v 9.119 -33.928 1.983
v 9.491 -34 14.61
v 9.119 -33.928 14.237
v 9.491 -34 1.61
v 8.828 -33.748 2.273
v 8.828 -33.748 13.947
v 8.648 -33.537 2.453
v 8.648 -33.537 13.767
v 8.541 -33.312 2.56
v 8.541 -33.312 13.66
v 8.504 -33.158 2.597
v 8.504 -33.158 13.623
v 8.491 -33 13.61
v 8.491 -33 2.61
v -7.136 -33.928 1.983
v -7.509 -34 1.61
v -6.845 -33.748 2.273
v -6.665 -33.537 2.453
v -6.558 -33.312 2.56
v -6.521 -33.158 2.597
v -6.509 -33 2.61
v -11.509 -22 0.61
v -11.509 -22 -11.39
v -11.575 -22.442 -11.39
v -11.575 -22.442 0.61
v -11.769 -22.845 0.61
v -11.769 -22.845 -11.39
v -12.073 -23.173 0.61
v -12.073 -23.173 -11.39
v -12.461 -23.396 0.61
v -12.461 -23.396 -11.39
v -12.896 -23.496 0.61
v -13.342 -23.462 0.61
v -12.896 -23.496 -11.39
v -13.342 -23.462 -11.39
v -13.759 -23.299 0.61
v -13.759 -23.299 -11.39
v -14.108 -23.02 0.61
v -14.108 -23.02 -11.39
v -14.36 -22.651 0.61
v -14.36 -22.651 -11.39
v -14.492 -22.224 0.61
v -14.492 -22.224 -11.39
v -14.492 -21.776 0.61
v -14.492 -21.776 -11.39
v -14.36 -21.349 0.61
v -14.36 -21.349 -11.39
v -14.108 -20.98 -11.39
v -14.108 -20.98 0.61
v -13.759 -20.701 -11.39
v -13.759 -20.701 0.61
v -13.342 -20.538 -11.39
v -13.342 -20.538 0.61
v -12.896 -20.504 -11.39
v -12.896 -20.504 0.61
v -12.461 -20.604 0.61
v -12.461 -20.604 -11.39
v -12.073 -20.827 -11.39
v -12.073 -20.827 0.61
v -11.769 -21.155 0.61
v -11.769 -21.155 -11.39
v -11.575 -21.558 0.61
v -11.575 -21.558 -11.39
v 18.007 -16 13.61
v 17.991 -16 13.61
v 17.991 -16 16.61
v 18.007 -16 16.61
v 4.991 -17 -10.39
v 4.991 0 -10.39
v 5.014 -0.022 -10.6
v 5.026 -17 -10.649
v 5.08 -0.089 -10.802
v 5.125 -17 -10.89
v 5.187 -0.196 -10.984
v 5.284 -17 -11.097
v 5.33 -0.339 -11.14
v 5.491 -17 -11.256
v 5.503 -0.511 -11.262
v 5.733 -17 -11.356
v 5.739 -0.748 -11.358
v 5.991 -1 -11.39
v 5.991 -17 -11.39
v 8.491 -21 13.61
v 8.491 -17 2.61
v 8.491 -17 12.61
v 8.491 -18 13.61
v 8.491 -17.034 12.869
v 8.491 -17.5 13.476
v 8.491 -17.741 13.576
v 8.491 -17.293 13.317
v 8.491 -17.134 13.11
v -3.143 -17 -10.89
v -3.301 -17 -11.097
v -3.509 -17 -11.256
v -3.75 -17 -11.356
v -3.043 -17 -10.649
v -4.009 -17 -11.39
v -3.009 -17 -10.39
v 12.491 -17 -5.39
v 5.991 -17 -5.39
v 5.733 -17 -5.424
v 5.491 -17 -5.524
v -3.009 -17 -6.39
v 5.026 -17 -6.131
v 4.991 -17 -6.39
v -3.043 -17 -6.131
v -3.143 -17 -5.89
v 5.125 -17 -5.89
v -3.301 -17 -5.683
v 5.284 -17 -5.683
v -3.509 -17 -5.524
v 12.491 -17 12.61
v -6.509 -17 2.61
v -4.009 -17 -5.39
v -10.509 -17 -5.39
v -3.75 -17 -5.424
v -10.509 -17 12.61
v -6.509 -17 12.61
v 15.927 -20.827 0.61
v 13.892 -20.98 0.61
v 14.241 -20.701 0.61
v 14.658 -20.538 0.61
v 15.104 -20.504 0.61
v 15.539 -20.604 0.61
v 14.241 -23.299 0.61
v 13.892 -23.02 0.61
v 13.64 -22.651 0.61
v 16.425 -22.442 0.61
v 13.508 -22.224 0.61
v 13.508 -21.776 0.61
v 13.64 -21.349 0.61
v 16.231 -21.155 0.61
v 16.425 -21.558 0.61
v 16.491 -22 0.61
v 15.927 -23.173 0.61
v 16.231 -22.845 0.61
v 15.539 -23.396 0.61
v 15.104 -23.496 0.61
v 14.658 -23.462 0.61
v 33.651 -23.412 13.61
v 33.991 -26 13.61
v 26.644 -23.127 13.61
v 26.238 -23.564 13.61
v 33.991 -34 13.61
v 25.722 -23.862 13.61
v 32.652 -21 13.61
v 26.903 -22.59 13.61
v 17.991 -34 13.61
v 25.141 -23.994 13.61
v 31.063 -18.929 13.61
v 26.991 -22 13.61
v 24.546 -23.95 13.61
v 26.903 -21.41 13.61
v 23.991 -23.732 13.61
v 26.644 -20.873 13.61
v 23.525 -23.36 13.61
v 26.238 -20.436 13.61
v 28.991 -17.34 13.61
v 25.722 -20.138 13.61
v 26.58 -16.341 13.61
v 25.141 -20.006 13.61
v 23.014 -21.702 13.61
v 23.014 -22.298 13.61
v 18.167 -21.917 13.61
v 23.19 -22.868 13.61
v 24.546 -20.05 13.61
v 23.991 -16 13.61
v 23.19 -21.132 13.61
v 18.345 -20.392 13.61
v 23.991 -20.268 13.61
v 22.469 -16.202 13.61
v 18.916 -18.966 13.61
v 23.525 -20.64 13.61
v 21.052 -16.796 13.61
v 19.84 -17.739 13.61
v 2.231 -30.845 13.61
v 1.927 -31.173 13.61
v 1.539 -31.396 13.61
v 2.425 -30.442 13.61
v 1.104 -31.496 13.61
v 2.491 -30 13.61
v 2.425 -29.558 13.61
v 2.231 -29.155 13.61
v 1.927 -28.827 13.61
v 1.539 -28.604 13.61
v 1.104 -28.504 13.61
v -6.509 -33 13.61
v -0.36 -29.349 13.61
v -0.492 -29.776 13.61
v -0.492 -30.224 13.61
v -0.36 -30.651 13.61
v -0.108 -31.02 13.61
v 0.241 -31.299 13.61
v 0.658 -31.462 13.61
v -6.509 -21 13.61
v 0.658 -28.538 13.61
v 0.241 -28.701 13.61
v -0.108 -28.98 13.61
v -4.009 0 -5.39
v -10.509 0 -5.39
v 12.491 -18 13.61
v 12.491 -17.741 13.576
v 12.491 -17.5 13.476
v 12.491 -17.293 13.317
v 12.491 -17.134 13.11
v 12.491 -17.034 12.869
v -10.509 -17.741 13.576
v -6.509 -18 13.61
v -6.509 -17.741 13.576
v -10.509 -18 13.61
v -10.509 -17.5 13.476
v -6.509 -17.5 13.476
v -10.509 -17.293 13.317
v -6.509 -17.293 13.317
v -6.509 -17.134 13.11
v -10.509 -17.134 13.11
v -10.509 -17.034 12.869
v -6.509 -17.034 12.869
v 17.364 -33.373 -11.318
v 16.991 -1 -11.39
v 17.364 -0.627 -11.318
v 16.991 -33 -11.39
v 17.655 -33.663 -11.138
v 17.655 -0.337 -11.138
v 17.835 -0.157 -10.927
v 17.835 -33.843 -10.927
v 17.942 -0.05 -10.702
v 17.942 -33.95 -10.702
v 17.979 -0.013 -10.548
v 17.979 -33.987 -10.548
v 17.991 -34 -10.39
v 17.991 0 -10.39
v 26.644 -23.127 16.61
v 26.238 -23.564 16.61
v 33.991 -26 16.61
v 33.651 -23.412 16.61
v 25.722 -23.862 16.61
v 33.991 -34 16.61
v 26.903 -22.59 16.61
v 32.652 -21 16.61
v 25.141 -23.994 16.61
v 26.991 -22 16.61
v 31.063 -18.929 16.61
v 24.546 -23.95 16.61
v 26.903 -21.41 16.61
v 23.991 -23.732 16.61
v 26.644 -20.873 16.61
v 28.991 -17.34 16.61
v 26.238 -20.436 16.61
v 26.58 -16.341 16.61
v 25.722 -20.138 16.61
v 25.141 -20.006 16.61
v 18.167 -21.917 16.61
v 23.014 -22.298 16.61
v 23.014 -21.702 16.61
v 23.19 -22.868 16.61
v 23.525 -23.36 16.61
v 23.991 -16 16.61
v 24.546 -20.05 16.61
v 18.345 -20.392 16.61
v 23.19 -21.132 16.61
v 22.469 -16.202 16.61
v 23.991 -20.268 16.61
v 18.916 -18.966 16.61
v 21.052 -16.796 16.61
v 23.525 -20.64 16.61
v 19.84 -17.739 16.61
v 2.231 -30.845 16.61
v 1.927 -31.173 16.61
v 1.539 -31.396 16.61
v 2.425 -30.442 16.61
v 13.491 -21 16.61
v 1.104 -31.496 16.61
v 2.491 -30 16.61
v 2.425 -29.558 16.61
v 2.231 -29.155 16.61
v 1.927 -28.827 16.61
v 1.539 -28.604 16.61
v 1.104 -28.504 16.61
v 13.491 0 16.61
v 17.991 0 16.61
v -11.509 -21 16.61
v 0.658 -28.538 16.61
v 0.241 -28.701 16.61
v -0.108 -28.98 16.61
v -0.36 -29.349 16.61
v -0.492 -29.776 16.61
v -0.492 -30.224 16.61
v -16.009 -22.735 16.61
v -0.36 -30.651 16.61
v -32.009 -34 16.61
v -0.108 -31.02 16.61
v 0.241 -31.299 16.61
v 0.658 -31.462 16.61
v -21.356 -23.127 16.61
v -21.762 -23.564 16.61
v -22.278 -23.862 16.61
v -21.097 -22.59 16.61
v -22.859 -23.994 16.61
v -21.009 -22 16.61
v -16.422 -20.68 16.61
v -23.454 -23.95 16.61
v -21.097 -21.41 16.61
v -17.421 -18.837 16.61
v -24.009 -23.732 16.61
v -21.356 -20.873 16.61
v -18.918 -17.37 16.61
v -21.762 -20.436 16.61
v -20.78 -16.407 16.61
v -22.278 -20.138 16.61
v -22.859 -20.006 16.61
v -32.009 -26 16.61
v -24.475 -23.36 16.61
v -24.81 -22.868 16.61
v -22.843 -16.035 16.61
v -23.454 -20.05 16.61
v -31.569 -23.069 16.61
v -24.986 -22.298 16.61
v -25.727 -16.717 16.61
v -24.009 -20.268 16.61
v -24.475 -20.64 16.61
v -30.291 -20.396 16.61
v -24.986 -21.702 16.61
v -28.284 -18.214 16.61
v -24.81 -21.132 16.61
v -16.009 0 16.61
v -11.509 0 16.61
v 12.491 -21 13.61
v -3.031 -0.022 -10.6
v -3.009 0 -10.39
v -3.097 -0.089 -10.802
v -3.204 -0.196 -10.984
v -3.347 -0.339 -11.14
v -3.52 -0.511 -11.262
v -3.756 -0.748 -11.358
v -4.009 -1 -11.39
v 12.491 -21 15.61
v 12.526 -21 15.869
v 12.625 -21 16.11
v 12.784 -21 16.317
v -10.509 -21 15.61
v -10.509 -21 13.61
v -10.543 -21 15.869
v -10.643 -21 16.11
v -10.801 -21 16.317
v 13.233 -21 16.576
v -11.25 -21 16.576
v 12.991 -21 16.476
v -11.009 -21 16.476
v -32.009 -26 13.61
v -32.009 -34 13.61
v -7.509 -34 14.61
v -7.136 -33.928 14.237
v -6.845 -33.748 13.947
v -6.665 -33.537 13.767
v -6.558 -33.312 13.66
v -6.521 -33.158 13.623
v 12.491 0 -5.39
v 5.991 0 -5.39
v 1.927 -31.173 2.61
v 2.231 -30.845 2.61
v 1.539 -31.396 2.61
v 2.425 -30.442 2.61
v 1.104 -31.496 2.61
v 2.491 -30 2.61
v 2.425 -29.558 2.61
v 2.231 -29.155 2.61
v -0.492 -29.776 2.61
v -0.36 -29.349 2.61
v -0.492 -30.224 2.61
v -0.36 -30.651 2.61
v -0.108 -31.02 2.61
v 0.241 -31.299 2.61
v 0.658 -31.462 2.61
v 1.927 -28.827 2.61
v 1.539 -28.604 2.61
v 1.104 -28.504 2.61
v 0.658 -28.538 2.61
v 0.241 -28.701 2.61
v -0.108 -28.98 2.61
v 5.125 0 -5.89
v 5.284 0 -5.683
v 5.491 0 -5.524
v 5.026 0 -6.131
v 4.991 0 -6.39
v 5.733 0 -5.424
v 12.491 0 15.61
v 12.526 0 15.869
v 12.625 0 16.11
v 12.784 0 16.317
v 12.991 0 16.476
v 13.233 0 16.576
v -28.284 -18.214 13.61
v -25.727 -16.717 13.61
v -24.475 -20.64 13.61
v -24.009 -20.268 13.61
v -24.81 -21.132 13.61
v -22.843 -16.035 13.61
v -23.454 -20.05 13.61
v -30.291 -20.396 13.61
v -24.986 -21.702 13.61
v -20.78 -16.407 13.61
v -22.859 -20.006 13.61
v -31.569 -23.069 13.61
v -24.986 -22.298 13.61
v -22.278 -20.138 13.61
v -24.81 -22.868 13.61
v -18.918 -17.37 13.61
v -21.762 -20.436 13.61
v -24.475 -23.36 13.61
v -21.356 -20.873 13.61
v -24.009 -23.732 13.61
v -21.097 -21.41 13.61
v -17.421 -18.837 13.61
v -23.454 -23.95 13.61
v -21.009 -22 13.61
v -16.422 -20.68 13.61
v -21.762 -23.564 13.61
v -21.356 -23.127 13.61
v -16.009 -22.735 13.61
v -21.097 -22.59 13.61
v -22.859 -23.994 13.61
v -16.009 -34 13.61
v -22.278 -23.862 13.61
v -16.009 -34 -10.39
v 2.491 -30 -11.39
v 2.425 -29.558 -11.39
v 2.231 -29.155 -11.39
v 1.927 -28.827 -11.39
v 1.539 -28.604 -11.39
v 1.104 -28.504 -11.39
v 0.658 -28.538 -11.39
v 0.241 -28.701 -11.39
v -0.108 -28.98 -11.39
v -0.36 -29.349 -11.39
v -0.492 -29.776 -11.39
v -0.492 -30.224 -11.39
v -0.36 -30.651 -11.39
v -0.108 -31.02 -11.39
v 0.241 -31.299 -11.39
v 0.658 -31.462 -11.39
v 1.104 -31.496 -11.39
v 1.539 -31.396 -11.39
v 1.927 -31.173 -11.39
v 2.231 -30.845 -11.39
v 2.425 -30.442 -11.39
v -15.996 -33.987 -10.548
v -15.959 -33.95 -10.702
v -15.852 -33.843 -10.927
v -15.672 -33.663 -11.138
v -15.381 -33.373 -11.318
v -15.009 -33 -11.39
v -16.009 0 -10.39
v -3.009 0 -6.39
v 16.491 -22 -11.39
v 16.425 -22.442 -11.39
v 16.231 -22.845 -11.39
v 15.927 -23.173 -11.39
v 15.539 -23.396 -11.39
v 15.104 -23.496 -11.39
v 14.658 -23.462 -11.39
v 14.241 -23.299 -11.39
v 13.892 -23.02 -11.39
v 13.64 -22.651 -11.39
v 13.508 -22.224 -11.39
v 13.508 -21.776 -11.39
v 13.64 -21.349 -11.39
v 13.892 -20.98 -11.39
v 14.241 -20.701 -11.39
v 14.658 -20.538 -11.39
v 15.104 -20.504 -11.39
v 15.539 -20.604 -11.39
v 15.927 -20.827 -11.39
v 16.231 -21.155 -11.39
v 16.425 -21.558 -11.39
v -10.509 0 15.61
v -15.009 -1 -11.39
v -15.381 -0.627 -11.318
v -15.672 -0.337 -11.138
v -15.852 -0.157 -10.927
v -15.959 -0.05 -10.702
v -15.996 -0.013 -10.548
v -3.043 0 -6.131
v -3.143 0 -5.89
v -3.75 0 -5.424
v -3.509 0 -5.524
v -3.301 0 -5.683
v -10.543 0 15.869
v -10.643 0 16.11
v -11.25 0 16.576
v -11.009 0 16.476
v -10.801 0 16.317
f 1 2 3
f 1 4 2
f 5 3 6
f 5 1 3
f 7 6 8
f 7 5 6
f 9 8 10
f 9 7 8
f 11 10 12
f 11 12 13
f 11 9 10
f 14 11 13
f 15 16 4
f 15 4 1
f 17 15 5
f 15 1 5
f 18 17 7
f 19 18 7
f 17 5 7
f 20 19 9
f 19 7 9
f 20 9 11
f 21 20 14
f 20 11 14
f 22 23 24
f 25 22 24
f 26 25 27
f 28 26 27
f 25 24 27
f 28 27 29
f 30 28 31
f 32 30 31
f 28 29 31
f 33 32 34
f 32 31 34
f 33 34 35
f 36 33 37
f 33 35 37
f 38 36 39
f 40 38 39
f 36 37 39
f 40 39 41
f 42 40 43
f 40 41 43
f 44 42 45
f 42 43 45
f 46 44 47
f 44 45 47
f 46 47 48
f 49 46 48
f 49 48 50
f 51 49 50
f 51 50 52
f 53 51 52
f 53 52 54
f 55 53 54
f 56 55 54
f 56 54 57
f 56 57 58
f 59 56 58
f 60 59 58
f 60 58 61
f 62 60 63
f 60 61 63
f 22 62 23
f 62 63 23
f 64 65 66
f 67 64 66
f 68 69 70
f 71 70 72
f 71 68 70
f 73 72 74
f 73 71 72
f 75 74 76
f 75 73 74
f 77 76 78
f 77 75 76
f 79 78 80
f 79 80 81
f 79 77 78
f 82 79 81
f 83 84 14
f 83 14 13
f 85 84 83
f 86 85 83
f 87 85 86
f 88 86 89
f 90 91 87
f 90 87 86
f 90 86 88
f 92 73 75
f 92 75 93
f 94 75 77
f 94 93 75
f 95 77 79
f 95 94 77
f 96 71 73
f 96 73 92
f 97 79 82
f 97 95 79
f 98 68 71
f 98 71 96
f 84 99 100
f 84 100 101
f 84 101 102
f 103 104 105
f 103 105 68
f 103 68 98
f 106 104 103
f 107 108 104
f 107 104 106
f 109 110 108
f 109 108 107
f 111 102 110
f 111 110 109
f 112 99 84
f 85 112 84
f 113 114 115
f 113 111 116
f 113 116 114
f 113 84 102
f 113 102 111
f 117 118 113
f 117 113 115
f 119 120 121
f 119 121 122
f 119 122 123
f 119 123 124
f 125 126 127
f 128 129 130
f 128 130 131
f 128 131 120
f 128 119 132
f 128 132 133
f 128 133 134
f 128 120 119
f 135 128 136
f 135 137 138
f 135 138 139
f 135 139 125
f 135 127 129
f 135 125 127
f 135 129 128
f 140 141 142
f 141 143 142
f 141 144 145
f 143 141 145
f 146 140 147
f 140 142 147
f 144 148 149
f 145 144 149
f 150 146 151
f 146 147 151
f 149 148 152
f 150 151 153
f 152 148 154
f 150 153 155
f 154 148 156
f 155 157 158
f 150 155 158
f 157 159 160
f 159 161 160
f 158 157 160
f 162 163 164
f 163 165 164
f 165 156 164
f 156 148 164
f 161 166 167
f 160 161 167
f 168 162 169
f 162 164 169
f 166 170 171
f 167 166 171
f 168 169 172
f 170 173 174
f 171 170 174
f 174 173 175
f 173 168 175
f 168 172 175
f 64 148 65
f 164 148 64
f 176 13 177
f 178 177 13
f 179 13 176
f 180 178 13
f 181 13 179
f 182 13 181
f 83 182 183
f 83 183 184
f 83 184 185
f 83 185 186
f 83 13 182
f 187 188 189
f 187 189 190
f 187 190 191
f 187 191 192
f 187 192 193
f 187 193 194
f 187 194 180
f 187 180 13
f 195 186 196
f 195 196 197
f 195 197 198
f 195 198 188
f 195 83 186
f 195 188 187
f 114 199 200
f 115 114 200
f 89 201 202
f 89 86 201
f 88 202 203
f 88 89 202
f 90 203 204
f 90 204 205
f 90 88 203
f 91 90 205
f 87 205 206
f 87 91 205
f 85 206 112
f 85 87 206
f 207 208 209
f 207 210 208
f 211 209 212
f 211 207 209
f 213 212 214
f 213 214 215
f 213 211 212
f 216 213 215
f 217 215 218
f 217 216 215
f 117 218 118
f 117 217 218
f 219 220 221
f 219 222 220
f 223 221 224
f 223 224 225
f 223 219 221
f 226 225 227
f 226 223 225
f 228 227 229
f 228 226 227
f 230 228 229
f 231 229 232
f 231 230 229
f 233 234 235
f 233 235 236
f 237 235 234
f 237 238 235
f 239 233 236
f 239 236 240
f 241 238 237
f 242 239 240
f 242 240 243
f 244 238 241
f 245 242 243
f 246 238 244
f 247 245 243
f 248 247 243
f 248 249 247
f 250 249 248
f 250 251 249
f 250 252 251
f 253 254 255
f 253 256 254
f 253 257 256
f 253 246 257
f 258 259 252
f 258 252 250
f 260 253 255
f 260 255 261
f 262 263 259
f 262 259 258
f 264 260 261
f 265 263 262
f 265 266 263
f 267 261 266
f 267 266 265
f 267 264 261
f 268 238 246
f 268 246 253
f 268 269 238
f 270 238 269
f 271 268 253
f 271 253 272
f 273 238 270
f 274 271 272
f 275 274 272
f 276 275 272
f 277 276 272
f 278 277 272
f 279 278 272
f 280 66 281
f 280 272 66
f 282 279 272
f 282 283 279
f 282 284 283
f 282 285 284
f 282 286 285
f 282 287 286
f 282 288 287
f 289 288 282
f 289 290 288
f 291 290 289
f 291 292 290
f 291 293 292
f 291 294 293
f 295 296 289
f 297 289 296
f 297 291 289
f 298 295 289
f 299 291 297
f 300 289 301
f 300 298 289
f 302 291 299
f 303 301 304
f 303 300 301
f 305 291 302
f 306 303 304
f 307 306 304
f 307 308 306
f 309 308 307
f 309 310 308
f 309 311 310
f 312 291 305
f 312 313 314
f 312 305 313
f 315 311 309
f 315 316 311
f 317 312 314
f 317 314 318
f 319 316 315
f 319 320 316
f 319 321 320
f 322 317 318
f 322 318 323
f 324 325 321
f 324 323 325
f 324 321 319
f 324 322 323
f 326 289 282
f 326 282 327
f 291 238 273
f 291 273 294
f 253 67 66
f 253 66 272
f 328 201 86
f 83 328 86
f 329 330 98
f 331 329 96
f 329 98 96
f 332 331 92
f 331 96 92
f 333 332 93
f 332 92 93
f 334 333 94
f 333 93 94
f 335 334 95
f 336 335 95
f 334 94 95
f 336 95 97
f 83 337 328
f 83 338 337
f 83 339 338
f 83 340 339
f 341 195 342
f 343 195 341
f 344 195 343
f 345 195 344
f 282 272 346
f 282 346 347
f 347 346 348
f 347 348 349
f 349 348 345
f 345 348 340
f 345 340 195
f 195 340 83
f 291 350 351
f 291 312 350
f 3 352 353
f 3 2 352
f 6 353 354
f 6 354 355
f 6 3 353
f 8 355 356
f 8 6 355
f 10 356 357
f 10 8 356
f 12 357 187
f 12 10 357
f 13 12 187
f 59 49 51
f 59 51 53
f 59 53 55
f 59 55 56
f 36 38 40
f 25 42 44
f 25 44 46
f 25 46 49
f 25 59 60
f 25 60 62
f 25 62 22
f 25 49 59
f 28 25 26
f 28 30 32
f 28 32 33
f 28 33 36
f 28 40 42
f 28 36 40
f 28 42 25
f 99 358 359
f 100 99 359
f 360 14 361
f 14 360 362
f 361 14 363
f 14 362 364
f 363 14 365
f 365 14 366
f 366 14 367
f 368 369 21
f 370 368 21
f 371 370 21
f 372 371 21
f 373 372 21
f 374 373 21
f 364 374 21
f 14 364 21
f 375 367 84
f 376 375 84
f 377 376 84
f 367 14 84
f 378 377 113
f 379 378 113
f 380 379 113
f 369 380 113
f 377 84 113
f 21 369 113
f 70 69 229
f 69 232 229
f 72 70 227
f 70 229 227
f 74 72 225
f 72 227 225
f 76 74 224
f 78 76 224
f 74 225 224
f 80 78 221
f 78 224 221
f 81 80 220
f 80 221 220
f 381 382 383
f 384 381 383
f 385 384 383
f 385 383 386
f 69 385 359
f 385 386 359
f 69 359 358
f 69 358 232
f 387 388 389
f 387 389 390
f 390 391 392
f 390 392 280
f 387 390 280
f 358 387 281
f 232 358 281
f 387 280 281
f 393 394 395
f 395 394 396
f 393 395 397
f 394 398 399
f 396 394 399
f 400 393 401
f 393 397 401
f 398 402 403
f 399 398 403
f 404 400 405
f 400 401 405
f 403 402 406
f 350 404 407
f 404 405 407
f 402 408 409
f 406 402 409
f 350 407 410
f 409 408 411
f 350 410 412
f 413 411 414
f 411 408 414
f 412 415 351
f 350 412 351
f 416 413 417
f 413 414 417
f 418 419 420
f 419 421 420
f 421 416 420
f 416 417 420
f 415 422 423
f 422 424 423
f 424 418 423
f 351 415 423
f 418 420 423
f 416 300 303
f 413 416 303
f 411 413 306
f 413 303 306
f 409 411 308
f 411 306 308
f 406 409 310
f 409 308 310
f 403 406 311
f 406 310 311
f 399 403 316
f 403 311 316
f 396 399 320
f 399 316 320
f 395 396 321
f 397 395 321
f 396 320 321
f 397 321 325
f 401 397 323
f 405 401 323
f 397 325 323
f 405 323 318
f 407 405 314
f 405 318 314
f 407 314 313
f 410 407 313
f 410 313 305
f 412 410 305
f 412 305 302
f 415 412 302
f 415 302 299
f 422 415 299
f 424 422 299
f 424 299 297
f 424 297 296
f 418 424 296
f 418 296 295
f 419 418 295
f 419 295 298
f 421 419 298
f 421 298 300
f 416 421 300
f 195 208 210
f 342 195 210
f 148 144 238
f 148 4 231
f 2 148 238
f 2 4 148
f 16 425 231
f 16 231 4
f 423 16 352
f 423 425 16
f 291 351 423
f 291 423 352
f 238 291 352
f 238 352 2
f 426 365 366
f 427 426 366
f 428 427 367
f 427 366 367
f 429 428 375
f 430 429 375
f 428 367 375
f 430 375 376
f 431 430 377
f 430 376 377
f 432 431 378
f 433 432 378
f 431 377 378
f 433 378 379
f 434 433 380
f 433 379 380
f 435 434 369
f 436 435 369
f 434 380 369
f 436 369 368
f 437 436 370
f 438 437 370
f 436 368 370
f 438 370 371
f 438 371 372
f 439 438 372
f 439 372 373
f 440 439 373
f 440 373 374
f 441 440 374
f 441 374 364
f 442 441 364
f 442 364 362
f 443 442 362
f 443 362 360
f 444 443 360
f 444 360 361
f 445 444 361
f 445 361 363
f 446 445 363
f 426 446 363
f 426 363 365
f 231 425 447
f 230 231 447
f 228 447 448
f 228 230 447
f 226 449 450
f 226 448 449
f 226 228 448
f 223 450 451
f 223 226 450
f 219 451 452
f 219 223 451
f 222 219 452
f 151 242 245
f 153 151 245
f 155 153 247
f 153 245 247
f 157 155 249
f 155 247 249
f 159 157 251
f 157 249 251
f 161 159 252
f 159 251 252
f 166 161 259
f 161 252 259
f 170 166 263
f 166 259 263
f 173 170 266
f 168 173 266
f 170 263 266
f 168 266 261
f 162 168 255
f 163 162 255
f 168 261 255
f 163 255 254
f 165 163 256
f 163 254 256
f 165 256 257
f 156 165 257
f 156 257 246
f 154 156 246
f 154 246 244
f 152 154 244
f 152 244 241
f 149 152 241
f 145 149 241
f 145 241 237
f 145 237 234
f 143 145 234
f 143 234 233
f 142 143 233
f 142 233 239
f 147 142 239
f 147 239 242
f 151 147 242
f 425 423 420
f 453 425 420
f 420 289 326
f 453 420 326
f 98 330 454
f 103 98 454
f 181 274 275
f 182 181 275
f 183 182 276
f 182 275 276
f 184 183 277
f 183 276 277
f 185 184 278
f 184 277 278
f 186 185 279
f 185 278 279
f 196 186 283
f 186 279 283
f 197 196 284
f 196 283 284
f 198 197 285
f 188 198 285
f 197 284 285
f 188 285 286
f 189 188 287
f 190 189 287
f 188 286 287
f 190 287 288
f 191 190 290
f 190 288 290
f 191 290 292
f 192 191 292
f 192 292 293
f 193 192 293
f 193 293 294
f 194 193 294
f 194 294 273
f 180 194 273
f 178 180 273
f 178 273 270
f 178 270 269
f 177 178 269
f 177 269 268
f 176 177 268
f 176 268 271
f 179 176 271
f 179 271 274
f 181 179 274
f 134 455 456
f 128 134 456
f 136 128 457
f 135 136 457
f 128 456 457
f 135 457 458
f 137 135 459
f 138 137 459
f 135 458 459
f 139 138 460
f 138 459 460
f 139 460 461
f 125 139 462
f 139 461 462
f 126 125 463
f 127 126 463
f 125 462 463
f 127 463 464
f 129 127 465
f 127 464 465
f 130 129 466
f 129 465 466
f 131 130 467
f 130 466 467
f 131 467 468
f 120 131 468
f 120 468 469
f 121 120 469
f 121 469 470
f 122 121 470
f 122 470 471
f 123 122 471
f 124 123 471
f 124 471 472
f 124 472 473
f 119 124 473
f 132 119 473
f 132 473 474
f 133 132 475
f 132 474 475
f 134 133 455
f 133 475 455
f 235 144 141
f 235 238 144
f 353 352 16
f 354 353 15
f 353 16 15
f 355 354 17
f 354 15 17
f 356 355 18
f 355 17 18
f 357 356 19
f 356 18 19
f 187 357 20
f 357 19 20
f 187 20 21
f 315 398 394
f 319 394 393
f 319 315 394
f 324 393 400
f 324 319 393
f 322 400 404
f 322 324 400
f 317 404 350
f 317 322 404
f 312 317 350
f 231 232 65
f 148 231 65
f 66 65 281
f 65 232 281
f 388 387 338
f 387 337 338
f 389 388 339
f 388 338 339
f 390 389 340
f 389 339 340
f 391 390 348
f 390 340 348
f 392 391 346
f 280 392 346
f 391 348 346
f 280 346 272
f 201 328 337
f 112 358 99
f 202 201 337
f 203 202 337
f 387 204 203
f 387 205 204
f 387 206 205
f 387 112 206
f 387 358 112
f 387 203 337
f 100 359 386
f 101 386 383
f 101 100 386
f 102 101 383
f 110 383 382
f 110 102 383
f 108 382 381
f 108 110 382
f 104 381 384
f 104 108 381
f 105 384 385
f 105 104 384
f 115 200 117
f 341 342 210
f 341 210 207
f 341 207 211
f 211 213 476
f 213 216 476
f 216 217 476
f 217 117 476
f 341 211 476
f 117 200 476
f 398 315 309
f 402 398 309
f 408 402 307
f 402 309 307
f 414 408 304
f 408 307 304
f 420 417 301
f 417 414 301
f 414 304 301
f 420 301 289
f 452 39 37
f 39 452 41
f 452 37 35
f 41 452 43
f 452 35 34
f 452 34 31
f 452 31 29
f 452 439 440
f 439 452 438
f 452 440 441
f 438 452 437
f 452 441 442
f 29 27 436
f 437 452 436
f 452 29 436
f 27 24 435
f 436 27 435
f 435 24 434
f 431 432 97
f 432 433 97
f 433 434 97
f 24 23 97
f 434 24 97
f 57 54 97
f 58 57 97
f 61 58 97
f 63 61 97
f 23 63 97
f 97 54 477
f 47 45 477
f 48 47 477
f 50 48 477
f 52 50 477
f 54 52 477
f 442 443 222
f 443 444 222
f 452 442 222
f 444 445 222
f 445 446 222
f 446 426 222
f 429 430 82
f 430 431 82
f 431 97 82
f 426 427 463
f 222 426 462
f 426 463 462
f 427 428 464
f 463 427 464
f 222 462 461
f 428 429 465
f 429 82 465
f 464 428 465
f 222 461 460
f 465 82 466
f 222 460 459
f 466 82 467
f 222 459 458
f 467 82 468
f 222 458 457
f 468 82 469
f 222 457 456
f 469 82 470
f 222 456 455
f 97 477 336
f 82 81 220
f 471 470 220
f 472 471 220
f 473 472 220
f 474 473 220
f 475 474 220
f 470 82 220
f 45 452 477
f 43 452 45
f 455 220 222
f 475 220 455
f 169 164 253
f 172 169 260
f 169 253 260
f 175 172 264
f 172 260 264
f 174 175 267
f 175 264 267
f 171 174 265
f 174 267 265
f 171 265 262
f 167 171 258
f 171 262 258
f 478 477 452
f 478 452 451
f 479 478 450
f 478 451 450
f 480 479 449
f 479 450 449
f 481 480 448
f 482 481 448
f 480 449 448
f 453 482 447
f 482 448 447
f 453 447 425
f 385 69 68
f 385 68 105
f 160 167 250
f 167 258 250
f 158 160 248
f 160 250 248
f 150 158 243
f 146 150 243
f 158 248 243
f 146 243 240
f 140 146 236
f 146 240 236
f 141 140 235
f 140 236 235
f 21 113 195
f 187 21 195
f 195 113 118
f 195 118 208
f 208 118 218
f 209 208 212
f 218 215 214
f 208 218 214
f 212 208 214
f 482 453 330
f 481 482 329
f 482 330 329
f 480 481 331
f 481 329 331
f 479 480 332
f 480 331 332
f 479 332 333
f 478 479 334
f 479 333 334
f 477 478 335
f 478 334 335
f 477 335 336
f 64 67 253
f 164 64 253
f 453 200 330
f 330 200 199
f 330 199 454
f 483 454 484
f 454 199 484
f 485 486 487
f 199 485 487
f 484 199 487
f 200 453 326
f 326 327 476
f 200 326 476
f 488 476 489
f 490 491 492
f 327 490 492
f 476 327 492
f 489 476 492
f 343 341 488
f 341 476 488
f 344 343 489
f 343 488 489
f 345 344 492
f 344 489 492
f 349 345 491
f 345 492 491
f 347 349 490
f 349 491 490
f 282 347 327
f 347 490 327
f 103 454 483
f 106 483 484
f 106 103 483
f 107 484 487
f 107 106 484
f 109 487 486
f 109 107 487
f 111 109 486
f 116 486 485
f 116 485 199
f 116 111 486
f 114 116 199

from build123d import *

# Parameters (mm, degrees)
F0_W      = 34
F0_H      = 28
F1_DEPTH  = 34
F3_R      = 1.5
F4_DEPTH  = 12
F5_W      = 8
F5_H      = 6
F6_DEPTH  = 17
F2_R      = 1.5
F7_DEPTH  = 28.001
F8_W      = 23
F8_H      = 3
F9_DEPTH  = 4
F10_W     = 15
F10_H     = 11
F11_DEPTH = 17.001
F12_W     = 18
F12_H     = 3
F13_DEPTH = 16
F14_W     = 18
F14_H     = 3
F15_DEPTH = 16
F16_R     = 10
F17_R     = 2
F18_DEPTH = 25
F19_R     = 1


with BuildPart() as f1:
    # F0 (on Front) → F1 (new body)
    with BuildSketch(Plane.XZ):
        with Locations((0.991450157, 2.6100003274)):
            Rectangle(F0_W, F0_H)
    extrude(amount=F1_DEPTH)

    # F3 (on face) → F4 (cut)
    with BuildSketch(Plane(origin=(0, 0, -11.3899996726), x_dir=(1, 0, 0), z_dir=(0, 0, -1))):
        with Locations((-13.008549843, 22)):
            Circle(F3_R)
        with Locations((14.991450157, 22)):
            Circle(F3_R)
    extrude(amount=-F4_DEPTH, mode=Mode.SUBTRACT)

    # F5 (on face) → F6 (cut)
    with BuildSketch(Plane(origin=(0, 0, 0), x_dir=(-1, 0, 0), z_dir=(0, 1, 0))):
        Polygon((10.508549843, 16.6100003274), (-12.491450157, 16.6100003274), (-12.491450157, -5.3899996726), (-4.991450157, -5.3899996726), (3.008549843, -5.3899996726), (10.508549843, -5.3899996726), align=None)
        with Locations((-0.991450157, -8.3899996726)):
            Rectangle(F5_W, F5_H)
    extrude(amount=-F6_DEPTH, mode=Mode.SUBTRACT)

    # F2 (on face) → F7 (cut, through all)
    with BuildSketch(Plane.XY.offset(16.6100003274)):
        with Locations((0.991450157, -30)):
            Circle(F2_R)
    extrude(amount=-F7_DEPTH, mode=Mode.SUBTRACT)

    # F8 (on face) → F9 (cut)
    with BuildSketch(Plane(origin=(0, -17, 0), x_dir=(-1, 0, 0), z_dir=(0, 1, 0))):
        with Locations((-0.991450157, 15.1100003274)):
            Rectangle(F8_W, F8_H)
    extrude(amount=-F9_DEPTH, mode=Mode.SUBTRACT)

    # F10 (on face) → F11 (cut, through all)
    with BuildSketch(Plane(origin=(0, -17, 0), x_dir=(-1, 0, 0), z_dir=(0, 1, 0))):
        with Locations((-0.991450157, 8.1100003274)):
            Rectangle(F10_W, F10_H)
    extrude(amount=-F11_DEPTH, mode=Mode.SUBTRACT)

    # F12 (on face) → F13 (join)
    with BuildSketch(Plane(origin=(-16.008549843, 0, 0), x_dir=(0, -1, 0), z_dir=(-1, 0, 0))):
        with Locations((25, 15.1100003274)):
            Rectangle(F12_W, F12_H)
    extrude(amount=F13_DEPTH)

    # F14 (on face) → F15 (join)
    with BuildSketch(Plane.YZ.offset(17.991450157)):
        with Locations((-25, 15.1100003274)):
            Rectangle(F14_W, F14_H)
    extrude(amount=F15_DEPTH)

    # F16
    f16_edges = [f1.edges().sort_by_distance(p)[0] for p in [
        (33.99145, -16, 15.11),
        (-32.00855, -16, 15.11),
    ]]
    fillet(f16_edges, radius=F16_R)

    # F17 (on face) → F18 (cut)
    with BuildSketch(Plane.XY.offset(16.6100003274)):
        with Locations((-23.008549843, -22)):
            Circle(F17_R)
        with Locations((24.991450157, -22)):
            Circle(F17_R)
        with BuildLine():
            Line((-16.008549843, -22.7352958173), (-16.008549843, -16))
            Line((-16.008549843, -16), (-22.008549843, -16))
            ThreePointArc((-22.008549843, -16), (-22.4260025255, -16.0087171365), (-22.8427274097, -16.0348533484))
            ThreePointArc((-22.8427274097, -16.0348533484), (-18.1144410308, -18.0477066054), (-16.008549843, -22.7352958173))
        make_face()
        with BuildLine():
            Line((18.007015779, -16), (18.1666726931, -21.9172614151))
            ThreePointArc((18.1666726931, -21.9172614151), (19.839883731, -17.7388207651), (23.991450157, -16))
            Line((23.991450157, -16), (18.007015779, -16))
        make_face()
    extrude(amount=-F18_DEPTH, mode=Mode.SUBTRACT)

    # F19
    f19_edges = [f1.edges().sort_by_distance(p)[0] for p in [
        (-16.00855, -17, -11.39),
        (17.99145, -17, -11.39),
        (4.99145, -8.5, -5.39),
        (-3.00855, -8.5, -5.39),
        (4.99145, -8.5, -11.39),
        (-3.00855, -8.5, -11.39),
        (12.49145, -10.5, 16.61),
        (-10.50855, -10.5, 16.61),
        (0.99145, -34, 2.61),
        (8.49145, -34, 8.11),
        (0.99145, -34, 13.61),
        (-6.50855, -34, 8.11),
        (-8.50855, -17, 13.61),
        (10.49145, -17, 13.61),
        (0.99145, -34, -11.39),
        (-9.50855, 0, -11.39),
        (11.49145, 0, -11.39),
    ]]
    fillet(f19_edges, radius=F19_R)


solid = f1.part
